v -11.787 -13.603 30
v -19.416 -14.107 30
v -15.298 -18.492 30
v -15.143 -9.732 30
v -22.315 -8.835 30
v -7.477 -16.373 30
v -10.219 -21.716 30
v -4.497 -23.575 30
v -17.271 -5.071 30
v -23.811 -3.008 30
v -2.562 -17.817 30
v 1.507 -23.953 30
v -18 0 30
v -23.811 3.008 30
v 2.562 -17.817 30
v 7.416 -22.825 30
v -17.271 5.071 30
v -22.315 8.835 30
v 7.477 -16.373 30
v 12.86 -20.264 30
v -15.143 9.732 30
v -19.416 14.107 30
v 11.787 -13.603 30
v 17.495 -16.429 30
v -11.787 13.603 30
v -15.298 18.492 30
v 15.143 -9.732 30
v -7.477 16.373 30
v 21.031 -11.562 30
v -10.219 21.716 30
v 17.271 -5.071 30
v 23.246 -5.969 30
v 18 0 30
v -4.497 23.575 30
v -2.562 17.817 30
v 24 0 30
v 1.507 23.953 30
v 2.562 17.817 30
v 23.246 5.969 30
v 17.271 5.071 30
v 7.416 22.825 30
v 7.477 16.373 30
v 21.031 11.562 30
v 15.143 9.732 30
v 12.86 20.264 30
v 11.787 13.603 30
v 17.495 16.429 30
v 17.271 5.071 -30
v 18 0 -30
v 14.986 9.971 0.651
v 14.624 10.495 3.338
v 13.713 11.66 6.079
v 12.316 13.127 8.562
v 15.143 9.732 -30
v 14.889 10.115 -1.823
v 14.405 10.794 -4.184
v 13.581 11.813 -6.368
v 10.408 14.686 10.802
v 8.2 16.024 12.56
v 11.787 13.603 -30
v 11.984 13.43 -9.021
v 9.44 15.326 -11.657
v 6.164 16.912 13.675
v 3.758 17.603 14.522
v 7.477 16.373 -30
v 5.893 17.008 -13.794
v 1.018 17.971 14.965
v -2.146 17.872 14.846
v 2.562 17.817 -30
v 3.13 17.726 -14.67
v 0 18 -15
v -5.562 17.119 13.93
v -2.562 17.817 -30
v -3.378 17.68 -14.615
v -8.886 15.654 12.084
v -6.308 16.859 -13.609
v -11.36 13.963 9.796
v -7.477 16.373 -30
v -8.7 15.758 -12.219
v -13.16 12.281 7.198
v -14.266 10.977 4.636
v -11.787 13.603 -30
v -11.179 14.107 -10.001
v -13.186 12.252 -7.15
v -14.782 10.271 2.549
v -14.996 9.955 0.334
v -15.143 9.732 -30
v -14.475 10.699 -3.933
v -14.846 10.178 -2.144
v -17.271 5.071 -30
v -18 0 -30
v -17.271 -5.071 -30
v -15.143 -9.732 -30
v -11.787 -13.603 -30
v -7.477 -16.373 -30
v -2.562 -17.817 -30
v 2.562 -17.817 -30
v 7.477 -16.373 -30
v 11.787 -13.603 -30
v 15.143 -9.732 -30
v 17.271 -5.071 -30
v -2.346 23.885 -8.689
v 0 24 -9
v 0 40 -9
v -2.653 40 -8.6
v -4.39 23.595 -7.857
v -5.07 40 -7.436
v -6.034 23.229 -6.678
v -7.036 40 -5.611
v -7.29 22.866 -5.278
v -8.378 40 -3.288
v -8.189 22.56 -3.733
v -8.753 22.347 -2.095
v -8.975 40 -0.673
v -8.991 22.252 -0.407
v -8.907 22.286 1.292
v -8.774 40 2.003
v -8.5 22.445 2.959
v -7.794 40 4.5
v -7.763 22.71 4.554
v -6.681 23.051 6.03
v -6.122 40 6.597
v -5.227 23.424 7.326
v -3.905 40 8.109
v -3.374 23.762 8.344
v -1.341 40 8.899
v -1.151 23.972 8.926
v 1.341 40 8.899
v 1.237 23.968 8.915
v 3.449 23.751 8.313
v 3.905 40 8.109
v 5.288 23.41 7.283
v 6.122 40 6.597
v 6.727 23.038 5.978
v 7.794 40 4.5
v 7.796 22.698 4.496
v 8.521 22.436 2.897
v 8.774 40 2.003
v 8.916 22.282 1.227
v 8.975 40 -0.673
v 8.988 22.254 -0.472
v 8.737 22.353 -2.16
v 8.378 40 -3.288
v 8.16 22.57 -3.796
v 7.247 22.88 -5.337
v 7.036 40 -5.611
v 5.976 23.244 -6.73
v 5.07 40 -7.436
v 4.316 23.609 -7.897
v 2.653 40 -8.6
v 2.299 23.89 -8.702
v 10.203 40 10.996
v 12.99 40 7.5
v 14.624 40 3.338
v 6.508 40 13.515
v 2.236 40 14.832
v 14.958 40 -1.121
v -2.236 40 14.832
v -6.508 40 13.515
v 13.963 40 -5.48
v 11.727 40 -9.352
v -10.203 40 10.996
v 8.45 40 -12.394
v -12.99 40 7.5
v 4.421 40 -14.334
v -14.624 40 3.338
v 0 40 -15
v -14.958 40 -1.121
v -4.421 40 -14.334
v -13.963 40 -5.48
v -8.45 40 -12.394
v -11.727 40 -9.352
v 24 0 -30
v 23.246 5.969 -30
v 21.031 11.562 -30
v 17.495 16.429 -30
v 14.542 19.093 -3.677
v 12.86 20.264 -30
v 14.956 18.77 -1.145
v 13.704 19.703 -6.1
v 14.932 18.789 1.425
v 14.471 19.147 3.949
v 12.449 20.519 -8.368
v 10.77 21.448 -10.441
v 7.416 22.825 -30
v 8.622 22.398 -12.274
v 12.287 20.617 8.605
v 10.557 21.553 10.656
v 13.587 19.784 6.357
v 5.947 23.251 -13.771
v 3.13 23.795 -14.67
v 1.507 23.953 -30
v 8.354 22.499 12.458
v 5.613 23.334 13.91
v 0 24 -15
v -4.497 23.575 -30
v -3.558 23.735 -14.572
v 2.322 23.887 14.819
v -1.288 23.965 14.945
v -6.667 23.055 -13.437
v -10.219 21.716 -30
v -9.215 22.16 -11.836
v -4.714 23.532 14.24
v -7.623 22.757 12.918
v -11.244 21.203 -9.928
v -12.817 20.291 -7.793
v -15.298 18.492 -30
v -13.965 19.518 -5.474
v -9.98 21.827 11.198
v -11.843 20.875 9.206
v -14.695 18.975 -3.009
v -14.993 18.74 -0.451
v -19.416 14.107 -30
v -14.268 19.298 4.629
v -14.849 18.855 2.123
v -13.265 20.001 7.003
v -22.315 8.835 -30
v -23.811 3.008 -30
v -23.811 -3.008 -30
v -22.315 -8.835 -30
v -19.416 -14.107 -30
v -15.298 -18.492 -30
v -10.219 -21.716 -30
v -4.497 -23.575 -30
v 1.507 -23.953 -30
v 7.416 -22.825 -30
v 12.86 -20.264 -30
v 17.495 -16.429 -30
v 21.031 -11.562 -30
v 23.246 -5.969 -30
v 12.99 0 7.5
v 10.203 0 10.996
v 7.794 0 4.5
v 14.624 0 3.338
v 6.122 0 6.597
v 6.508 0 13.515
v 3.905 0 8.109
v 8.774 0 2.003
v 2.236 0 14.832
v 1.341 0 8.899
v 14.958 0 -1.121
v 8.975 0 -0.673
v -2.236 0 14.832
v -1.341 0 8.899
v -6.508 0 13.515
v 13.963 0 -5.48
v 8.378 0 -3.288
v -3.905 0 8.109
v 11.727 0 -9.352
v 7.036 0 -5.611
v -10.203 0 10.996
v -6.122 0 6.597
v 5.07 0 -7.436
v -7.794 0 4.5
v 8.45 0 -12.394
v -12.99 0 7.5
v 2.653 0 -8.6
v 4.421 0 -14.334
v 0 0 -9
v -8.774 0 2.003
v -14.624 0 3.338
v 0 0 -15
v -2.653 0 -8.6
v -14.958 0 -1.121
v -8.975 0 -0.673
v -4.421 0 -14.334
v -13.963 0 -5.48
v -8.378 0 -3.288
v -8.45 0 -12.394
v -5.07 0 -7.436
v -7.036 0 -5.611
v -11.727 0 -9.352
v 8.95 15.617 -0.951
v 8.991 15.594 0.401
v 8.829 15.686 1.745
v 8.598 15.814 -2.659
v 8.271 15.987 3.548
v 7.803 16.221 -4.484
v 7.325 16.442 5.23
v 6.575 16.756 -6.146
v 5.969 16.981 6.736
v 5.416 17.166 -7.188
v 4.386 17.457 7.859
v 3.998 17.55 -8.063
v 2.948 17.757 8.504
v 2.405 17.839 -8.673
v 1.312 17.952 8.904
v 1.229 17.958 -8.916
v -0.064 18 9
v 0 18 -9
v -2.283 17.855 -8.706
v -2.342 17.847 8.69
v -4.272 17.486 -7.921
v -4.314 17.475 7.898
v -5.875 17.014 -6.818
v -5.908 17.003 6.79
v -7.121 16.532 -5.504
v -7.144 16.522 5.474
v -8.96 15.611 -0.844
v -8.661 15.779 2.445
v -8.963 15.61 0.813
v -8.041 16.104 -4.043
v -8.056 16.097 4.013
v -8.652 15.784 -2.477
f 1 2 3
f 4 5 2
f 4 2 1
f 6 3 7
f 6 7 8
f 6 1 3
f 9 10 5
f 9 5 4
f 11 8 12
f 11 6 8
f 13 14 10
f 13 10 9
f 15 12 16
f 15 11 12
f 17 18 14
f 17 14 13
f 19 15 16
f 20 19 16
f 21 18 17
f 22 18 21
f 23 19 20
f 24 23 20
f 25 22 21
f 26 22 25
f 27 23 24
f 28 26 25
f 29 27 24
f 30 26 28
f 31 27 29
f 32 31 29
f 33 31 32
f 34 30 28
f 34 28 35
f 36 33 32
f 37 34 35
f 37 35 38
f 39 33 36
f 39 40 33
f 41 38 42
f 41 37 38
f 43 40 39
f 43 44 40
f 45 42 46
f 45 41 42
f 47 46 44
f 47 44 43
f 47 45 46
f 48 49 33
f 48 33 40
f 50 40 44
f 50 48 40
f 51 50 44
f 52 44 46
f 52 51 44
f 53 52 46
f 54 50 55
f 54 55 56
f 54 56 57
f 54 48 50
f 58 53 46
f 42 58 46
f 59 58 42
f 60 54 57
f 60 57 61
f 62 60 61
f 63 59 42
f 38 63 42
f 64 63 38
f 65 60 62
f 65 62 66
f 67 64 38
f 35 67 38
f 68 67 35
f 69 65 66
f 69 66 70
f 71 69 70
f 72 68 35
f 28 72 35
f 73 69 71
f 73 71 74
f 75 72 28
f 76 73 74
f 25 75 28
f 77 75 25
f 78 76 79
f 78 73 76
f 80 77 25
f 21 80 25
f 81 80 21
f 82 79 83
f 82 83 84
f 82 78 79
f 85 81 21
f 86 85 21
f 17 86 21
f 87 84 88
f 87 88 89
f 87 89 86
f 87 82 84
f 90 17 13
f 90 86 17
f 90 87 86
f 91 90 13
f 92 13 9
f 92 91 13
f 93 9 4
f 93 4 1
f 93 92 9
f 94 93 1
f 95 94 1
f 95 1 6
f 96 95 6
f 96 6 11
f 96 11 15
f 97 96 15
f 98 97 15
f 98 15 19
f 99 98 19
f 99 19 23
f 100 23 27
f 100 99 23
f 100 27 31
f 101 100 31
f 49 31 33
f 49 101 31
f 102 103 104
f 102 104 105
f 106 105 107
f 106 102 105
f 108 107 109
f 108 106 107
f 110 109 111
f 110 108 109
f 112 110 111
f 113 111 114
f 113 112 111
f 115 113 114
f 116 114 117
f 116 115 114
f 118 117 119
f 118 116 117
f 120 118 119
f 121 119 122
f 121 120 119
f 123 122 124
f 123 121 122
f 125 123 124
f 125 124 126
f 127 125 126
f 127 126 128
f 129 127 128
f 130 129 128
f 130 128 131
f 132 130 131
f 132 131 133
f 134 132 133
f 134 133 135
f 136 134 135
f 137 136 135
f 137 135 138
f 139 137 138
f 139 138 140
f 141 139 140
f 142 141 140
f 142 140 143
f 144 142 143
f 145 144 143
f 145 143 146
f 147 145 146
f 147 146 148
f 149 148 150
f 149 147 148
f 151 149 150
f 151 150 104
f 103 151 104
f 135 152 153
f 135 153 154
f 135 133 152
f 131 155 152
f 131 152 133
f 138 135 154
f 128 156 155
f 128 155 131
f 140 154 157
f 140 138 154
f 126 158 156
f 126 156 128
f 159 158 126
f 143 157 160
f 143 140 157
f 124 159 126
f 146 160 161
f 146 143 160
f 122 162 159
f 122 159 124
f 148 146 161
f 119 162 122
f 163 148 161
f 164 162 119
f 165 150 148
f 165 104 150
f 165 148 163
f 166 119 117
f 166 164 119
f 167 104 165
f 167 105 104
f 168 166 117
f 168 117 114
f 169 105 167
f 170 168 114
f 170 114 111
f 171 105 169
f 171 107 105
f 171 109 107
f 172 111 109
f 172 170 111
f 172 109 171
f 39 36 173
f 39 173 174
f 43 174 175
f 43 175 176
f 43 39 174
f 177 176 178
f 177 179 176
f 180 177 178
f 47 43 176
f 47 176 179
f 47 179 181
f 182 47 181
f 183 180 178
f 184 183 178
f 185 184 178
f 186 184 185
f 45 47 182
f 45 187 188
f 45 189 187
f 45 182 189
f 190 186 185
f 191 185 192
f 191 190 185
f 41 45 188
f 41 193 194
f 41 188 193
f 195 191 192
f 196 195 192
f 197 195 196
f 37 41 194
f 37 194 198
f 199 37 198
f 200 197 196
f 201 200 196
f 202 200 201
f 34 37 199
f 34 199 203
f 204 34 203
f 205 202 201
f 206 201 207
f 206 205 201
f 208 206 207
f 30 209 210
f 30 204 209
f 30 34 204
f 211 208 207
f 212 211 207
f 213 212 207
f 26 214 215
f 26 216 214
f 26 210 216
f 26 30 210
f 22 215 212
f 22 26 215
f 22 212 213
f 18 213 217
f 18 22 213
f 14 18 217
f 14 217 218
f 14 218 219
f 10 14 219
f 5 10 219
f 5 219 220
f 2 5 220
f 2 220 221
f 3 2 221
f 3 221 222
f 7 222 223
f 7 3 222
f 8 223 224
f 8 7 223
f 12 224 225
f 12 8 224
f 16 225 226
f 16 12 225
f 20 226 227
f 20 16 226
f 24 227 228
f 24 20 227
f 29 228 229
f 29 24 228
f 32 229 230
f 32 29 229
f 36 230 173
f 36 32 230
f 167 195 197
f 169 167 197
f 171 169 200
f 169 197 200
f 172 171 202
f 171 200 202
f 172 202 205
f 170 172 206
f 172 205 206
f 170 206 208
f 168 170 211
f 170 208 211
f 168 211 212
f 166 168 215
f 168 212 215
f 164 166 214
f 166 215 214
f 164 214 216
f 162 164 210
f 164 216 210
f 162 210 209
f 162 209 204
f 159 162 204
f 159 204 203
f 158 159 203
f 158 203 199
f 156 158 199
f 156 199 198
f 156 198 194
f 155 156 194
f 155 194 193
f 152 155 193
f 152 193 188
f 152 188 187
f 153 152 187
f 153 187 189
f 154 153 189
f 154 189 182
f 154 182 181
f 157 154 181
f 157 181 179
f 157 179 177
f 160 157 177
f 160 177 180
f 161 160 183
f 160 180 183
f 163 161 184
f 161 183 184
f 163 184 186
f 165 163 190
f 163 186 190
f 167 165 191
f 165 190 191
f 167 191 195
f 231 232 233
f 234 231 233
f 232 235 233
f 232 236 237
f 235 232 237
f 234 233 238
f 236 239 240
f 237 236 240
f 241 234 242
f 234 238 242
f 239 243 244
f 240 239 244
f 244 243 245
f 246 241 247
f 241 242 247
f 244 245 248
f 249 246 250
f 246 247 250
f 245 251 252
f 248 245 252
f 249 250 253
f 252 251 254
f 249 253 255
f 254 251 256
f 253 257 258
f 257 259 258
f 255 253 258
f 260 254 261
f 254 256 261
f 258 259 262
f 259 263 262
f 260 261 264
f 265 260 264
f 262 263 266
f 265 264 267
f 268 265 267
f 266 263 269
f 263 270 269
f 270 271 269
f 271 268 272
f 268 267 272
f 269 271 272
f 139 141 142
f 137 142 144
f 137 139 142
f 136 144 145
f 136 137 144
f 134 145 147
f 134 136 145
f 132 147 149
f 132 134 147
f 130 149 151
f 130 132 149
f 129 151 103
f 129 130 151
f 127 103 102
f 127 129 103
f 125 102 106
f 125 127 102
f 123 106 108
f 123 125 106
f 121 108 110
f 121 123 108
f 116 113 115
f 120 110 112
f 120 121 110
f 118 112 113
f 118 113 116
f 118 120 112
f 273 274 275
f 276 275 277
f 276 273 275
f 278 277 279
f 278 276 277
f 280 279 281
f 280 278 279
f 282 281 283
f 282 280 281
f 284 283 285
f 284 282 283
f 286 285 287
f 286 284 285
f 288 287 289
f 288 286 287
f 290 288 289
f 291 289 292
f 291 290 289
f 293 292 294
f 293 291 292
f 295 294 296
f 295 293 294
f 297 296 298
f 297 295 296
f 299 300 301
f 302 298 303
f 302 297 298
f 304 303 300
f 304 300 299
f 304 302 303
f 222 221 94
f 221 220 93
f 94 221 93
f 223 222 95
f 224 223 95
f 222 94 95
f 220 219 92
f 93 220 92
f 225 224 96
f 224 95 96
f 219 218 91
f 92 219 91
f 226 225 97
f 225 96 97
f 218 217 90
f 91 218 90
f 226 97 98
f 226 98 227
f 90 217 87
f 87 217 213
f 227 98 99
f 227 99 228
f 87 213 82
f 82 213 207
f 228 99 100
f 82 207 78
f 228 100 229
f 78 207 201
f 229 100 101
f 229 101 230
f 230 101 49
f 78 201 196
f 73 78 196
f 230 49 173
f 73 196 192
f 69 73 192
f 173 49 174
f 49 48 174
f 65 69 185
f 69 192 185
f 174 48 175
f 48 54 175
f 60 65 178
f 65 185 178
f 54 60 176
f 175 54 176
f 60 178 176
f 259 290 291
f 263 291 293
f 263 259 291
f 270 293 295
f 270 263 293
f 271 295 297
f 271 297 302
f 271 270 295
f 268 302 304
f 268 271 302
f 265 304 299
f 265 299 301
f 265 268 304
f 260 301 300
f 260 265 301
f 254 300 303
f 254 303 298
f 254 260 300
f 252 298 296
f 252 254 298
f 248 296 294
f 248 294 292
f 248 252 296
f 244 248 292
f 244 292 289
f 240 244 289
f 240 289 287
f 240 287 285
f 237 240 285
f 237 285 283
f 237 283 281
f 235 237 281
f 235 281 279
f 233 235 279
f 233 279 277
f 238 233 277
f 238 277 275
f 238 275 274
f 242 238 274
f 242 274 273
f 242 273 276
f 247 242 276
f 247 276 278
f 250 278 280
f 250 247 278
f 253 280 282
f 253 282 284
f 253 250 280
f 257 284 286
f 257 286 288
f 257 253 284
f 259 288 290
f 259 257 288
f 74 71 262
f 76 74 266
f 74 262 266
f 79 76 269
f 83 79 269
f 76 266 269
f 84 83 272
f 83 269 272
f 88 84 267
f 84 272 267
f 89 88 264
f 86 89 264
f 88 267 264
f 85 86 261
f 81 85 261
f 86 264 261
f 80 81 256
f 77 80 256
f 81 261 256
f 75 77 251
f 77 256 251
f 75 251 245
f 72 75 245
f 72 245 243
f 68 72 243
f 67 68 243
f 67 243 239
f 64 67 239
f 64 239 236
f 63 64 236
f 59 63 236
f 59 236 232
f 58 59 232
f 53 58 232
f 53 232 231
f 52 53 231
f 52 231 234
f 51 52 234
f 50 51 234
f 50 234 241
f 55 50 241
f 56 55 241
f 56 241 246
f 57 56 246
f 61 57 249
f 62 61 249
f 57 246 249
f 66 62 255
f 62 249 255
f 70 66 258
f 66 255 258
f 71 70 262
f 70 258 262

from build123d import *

# Parameters (mm, degrees)
CROQUIS1_R              = 24
CROQUIS1_R_2            = 18
SALIENTE_EXTRUIR1_DEPTH = 30
CROQUIS2_R              = 15
CROQUIS2_R_2            = 9
SALIENTE_EXTRUIR2_DEPTH = 40


with BuildPart() as part:
    # Croquis1 → Saliente-Extruir1 (new, symmetric)
    with BuildSketch(Plane.XY):
        Circle(CROQUIS1_R)
        Circle(CROQUIS1_R_2, mode=Mode.SUBTRACT)
    extrude(amount=SALIENTE_EXTRUIR1_DEPTH, both=True)

    # Croquis2 → Saliente-Extruir2 (add)
    with BuildSketch(Plane(origin=(0, 0, 0), x_dir=(1, 0, 0), z_dir=(0, 1, 0))):
        with Locations(Location((0, 0, 0), (0, 0, 90))):
            Circle(CROQUIS2_R)
        with Locations(Location((0, 0, 0), (0, 0, 90))):
            Circle(CROQUIS2_R_2, mode=Mode.SUBTRACT)
    extrude(amount=SALIENTE_EXTRUIR2_DEPTH)


solid = part.part
